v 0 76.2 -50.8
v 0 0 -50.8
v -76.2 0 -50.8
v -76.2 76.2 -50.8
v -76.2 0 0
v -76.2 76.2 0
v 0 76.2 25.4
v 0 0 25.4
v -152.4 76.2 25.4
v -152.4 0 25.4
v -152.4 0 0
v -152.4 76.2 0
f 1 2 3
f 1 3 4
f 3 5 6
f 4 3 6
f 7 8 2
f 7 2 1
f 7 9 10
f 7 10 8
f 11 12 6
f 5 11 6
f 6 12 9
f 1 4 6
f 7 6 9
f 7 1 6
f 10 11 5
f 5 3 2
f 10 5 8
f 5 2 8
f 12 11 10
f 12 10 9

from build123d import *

# Parameters (mm, degrees)
F0_W     = 152.4
F0_H     = 76.2
F1_DEPTH = 25.4
F2_W     = 76.2
F2_H     = 50.8
F3_DEPTH = 76.2


with BuildPart() as f1:
    # F0 (on Top) → F1 (new body)
    with BuildSketch(Plane.XY):
        with Locations((-76.2, 38.1)):
            Rectangle(F0_W, F0_H)
    extrude(amount=F1_DEPTH)

    # F2 (on Right) → F3 (join)
    with BuildSketch(Plane.YZ):
        with Locations((38.1, -25.4)):
            Rectangle(F2_W, F2_H)
    extrude(amount=-F3_DEPTH)


solid = f1.part
